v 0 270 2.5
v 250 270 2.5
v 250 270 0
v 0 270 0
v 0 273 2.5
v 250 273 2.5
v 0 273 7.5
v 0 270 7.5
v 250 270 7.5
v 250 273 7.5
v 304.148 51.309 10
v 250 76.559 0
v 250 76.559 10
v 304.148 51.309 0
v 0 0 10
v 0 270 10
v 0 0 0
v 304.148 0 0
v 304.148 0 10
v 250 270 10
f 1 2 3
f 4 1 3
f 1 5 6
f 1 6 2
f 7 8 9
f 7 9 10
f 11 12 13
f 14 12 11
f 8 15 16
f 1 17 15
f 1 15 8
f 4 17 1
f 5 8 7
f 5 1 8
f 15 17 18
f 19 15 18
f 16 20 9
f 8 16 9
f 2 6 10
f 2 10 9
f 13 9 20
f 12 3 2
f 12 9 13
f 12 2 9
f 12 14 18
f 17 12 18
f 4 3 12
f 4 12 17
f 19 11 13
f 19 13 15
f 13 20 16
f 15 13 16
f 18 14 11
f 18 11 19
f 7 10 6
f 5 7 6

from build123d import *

# Parameters (mm, degrees)
EXTRUDE_1_DEPTH     = 10
CUT_EXTRUDE_1_DEPTH = 431.232495286


with BuildPart() as part:
    # 草圖1 → 填料-伸長1 (new body)
    with BuildSketch(Plane.XY):
        Polygon((250, 76.558764576), (304.147622093, 51.309313723), (304.147622093, 0), (154.147622093, 0), (0, 0), (0, 350), (250, 350), align=None)
    extrude(amount=EXTRUDE_1_DEPTH)

    # 草圖3 → 除料-伸長1 (cut, through all)
    with BuildSketch(Plane(origin=(250, 0, 0), x_dir=(0, 0, -1), z_dir=(1, 0, 0))):
        Polygon((0, 350), (-10, 350), (-10, 270), (-7.5, 270), (-7.5, 273), (-2.5, 273), (-2.5, 270), (0, 270), align=None)
    extrude(amount=-CUT_EXTRUDE_1_DEPTH, mode=Mode.SUBTRACT)


solid = part.part
